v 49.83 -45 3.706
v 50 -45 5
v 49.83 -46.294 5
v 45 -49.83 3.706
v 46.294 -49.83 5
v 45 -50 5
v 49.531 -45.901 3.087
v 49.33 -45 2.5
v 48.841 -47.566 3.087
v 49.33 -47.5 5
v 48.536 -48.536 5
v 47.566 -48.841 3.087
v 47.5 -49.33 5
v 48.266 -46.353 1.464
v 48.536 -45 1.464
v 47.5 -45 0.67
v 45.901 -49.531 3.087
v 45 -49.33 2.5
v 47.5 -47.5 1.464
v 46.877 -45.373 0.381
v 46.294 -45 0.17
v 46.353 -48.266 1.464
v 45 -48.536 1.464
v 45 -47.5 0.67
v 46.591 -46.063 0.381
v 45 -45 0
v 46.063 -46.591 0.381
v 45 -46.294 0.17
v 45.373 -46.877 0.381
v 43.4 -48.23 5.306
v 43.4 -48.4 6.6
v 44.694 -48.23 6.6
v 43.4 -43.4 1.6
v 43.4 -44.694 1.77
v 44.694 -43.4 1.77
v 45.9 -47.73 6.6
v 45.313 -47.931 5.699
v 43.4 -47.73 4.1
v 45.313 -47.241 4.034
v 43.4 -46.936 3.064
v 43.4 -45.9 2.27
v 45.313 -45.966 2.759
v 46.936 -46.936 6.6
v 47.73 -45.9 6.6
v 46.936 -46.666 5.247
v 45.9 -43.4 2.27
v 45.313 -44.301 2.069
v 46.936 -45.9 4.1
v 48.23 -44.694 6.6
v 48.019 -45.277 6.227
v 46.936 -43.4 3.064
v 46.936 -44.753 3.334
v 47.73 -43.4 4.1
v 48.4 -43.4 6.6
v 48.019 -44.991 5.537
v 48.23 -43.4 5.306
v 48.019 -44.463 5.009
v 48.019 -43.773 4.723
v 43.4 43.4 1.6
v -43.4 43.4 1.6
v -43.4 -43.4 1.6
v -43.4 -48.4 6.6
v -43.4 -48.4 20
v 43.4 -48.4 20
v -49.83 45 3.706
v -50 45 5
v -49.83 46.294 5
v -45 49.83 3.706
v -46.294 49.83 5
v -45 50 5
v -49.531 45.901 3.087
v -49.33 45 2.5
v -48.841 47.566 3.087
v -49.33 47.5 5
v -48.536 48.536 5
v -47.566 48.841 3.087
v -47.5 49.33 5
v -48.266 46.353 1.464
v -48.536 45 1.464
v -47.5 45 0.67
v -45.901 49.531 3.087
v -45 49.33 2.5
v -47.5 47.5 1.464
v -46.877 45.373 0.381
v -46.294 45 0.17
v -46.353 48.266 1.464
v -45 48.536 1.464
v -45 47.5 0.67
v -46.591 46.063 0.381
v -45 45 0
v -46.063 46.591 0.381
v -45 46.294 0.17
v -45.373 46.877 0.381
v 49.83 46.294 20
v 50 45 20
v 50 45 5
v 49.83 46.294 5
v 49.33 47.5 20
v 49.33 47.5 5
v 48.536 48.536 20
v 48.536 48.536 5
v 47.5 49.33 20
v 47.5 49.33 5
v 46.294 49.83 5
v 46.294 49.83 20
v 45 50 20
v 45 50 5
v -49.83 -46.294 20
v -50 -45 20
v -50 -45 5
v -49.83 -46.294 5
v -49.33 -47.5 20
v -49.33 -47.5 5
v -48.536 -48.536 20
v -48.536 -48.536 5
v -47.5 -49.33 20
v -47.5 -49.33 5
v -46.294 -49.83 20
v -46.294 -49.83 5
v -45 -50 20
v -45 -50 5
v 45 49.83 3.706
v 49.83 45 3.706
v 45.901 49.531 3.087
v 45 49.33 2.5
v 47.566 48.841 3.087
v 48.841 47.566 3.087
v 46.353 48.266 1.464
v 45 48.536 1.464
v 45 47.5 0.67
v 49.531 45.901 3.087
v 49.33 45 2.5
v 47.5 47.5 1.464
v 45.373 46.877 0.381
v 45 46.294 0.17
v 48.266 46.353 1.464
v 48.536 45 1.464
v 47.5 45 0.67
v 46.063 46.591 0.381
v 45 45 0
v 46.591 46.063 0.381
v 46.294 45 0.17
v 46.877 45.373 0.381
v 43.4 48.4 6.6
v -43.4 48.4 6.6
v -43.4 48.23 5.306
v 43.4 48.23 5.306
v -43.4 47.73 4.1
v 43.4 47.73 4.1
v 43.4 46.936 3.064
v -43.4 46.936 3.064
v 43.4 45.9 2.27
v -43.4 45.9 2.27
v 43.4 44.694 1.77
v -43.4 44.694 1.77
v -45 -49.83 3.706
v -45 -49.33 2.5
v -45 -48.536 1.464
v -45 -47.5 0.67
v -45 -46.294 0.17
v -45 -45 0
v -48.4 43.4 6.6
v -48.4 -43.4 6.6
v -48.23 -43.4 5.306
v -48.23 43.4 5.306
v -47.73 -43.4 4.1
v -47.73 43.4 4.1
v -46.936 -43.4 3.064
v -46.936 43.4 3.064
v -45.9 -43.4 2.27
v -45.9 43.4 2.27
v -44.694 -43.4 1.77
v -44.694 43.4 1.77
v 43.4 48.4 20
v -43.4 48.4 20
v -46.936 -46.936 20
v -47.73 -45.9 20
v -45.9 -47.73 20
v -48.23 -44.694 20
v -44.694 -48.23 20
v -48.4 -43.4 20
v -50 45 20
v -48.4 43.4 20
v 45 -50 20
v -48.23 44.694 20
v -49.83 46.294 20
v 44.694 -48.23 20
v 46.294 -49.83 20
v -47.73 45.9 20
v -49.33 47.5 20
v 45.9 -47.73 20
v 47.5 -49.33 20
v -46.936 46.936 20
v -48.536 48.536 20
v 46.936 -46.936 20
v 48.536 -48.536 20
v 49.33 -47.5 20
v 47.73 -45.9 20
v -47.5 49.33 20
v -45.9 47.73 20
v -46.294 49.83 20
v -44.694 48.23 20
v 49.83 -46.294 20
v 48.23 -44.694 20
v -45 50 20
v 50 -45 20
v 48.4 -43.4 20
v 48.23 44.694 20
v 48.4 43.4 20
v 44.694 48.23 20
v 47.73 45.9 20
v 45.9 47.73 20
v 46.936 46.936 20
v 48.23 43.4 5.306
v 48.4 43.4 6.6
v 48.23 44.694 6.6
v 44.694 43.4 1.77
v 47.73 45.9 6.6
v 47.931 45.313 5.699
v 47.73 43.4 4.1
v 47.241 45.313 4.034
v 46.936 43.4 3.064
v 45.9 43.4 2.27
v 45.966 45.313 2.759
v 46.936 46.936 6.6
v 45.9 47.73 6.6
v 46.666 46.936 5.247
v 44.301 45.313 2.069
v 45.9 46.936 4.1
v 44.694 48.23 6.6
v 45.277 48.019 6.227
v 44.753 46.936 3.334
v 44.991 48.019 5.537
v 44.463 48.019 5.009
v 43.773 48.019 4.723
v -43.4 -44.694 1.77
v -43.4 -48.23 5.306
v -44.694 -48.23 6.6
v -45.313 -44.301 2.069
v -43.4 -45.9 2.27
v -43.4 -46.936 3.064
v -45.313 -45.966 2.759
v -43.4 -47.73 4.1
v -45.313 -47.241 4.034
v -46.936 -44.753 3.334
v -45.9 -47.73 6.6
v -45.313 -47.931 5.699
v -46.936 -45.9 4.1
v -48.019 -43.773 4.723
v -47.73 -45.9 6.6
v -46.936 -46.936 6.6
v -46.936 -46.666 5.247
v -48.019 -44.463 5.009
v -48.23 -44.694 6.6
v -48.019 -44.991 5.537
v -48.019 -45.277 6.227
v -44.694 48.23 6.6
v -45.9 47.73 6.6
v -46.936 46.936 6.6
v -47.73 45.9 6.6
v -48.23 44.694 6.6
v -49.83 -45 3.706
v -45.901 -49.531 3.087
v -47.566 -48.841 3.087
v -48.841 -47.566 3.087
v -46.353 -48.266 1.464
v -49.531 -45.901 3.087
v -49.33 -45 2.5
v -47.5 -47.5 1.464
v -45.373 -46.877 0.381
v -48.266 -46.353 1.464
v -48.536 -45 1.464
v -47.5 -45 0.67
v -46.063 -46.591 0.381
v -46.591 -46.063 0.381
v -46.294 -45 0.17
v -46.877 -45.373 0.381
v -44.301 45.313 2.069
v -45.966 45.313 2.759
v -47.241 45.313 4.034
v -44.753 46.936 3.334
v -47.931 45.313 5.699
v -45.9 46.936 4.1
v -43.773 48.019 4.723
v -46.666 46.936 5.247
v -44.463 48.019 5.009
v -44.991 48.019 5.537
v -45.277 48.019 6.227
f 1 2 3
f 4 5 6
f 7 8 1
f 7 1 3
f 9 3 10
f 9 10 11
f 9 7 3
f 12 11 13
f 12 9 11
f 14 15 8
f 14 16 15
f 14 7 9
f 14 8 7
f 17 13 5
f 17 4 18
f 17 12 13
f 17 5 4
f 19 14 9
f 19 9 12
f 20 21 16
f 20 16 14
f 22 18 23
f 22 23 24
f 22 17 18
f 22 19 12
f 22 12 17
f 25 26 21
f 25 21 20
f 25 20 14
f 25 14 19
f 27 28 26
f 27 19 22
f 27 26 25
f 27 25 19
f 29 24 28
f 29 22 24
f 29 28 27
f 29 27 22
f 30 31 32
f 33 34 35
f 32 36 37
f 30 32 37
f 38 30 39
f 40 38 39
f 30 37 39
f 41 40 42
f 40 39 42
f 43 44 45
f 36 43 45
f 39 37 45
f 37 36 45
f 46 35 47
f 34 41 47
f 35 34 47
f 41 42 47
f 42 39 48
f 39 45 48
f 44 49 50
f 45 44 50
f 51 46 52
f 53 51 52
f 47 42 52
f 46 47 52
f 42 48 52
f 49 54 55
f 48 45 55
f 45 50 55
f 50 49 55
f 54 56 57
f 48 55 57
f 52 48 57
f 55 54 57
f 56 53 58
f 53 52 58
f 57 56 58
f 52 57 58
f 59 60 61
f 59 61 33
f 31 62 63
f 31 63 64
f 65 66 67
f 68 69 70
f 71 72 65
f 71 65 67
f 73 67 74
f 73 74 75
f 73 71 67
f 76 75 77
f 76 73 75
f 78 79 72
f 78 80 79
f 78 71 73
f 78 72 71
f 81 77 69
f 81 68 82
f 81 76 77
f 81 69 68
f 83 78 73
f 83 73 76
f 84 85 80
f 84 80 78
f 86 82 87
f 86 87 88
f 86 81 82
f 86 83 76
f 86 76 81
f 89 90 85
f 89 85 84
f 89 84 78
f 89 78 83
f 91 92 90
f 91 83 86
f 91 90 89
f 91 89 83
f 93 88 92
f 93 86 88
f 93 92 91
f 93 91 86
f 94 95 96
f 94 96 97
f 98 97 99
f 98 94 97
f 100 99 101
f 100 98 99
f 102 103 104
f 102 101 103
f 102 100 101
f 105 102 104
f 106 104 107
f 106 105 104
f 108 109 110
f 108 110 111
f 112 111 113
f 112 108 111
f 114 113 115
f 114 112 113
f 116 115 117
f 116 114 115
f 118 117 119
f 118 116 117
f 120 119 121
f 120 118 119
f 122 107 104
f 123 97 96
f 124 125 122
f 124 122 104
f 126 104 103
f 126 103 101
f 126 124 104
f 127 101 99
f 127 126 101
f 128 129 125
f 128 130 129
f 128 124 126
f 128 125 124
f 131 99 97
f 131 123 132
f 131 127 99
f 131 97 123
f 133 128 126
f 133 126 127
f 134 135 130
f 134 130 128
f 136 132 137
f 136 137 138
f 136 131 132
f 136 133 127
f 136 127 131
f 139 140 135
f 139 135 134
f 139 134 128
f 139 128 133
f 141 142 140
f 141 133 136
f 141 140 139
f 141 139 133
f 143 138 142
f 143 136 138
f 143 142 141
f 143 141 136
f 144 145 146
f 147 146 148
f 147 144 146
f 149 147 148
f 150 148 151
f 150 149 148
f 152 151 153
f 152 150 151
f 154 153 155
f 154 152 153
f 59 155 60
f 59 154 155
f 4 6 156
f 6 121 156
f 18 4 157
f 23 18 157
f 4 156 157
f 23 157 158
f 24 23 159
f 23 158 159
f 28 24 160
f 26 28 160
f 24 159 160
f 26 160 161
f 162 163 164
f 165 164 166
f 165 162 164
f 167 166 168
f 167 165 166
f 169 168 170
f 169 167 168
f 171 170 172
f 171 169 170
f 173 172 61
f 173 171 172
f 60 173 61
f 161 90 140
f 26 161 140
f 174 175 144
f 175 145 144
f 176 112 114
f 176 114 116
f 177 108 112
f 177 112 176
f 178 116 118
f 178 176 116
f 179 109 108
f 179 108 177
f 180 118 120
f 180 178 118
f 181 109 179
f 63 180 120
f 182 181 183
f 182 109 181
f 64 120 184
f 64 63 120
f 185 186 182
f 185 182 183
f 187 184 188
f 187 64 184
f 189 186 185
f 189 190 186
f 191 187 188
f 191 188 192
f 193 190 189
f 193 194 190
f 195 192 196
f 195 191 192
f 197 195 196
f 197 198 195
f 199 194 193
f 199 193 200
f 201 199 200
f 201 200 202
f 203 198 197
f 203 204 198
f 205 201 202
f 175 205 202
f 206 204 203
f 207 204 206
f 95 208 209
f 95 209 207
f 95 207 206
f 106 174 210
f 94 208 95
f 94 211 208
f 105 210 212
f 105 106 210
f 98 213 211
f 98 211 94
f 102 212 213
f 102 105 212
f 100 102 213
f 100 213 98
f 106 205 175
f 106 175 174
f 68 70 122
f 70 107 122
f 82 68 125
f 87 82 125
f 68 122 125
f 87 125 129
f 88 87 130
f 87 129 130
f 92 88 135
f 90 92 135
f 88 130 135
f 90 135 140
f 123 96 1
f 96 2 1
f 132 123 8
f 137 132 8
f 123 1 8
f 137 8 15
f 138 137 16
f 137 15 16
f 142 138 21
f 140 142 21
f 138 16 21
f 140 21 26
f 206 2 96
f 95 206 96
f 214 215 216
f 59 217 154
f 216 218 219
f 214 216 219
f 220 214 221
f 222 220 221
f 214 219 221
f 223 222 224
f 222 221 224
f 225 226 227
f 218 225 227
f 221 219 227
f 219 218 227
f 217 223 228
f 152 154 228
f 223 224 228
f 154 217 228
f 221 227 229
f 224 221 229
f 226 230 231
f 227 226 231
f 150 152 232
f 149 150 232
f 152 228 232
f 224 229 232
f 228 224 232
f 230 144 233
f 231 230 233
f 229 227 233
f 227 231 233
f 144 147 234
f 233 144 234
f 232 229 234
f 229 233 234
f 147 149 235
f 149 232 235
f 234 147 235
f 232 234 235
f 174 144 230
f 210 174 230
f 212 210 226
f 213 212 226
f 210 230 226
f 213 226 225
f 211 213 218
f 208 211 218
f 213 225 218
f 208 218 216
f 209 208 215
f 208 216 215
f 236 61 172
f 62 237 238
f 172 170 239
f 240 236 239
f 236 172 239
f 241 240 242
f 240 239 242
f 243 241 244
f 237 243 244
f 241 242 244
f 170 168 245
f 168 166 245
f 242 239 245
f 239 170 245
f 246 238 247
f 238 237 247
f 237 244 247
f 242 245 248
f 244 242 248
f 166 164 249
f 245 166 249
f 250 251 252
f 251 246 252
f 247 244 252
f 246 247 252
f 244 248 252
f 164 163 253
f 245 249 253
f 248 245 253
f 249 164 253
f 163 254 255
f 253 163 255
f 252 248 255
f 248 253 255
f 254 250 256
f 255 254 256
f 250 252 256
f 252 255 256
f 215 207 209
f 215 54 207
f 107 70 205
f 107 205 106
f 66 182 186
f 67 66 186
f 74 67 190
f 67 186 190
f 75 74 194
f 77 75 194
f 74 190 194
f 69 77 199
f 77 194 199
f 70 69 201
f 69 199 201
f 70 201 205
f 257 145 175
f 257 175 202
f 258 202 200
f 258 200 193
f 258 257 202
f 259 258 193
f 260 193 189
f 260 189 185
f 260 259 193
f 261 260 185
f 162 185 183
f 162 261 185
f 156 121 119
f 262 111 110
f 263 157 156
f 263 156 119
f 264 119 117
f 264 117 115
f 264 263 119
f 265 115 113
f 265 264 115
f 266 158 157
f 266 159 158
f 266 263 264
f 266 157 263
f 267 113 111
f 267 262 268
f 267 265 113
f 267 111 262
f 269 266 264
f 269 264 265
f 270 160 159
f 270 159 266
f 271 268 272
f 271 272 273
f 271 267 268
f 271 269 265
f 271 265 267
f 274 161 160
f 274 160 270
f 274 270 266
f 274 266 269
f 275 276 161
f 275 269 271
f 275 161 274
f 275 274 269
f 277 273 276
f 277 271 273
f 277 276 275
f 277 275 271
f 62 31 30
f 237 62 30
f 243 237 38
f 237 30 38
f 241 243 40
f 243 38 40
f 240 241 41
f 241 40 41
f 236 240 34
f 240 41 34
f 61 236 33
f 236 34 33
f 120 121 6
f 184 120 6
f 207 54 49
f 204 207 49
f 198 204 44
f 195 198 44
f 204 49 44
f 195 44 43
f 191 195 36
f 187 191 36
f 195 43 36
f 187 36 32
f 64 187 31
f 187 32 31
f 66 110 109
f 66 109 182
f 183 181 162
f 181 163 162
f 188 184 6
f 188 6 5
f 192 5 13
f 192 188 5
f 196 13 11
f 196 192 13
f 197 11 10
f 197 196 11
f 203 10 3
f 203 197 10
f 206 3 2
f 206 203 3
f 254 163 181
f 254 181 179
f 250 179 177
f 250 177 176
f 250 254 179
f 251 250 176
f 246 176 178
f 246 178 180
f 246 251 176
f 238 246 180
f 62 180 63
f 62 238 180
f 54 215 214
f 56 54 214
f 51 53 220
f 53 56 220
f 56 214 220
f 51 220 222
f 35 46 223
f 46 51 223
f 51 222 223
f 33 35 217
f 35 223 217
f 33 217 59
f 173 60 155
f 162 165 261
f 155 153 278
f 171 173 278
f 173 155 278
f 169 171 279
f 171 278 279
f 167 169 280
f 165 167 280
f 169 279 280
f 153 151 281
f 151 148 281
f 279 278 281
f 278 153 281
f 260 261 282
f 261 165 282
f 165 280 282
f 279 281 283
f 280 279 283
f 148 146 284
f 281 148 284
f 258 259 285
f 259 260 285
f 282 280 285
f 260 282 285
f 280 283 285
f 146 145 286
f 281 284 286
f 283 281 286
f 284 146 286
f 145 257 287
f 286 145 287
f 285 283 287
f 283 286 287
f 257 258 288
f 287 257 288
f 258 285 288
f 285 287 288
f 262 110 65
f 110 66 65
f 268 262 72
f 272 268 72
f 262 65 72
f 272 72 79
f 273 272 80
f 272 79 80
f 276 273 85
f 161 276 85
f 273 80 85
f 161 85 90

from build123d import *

# Parameters (mm, degrees)
F0_W         = 100
F0_H         = 100
F1_DEPTH     = 20
F2_T         = -1.6
F3_R         = 5
F4_T1_DEPTH  = 13.4
F4_S5_W      = 5
F4_S5_H      = 5
F4_T6_DEPTH  = 5
F4_S11_W     = 5
F4_S11_H     = 5
F4_T12_DEPTH = 5
F4_S17_W     = 5
F4_S17_H     = 5
F4_T18_DEPTH = 5
F4_S23_W     = 5
F4_S23_H     = 5
F4_T24_DEPTH = 5
F5_R         = 5
F6_R         = 5


# Not quite as in the source:
# - a fillet or chamfer that OpenCascade refuses, or shapes differently, is made with other operations: its cross-section is extruded or revolved along the edge and cut away or added


with BuildPart() as f1:
    # F0 (on Top) → F1 (new body)
    with BuildSketch(Plane.XY):
        Rectangle(F0_W, F0_H)
    extrude(amount=F1_DEPTH)

    # F2
    f2_openings = [f1.faces().sort_by_distance(p)[0] for p in [
        (0, 0, 20),
    ]]
    offset(amount=F2_T, openings=f2_openings)

    # F3
    f3_edges = [f1.edges().sort_by_distance(p)[0] for p in [
        (-48.4, 0, 1.6),
        (0, 48.4, 1.6),
        (48.4, 0, 1.6),
        (0, -48.4, 1.6),
    ]]
    fillet(f3_edges, radius=F3_R)

    # F4: fillet of radius 5 on 8 edges, made by hand

    # F4_s2 → F4_t1 (join)
    with BuildSketch(Plane.XY.offset(6.6)):
        with BuildLine():
            ThreePointArc((43.4, 48.4), (46.9355339059, 46.9355339059), (48.4, 43.4))
            Line((48.4, 43.4), (48.4, 48.4))
            Line((48.4, 48.4), (43.4, 48.4))
        make_face()
        with BuildLine():
            ThreePointArc((48.4, -43.4), (46.9355339059, -46.9355339059), (43.4, -48.4))
            Line((43.4, -48.4), (48.4, -48.4))
            Line((48.4, -48.4), (48.4, -43.4))
        make_face()
        with BuildLine():
            ThreePointArc((-48.4, -43.4), (-46.9355339059, -46.9355339059), (-43.4, -48.4))
            Line((-43.4, -48.4), (-48.4, -48.4))
            Line((-48.4, -48.4), (-48.4, -43.4))
        make_face()
        with BuildLine():
            ThreePointArc((-43.4, 48.4), (-46.9355339059, 46.9355339059), (-48.4, 43.4))
            Line((-48.4, 43.4), (-48.4, 48.4))
            Line((-48.4, 48.4), (-43.4, 48.4))
        make_face()
    extrude(amount=F4_T1_DEPTH)


with BuildPart() as f4_tool4:
    # F4_s5 → F4_t6 (new body)
    with BuildSketch(Plane.XZ.offset(-43.4)):
        with Locations((45.9, 4.1)):
            Rectangle(F4_S5_W, F4_S5_H)
    extrude(amount=-F4_T6_DEPTH)

    # F4_s7 → F4_t8 (revolve, cut)
    with BuildSketch(Plane(origin=(43.4, 43.4, 6.6), x_dir=(-0.7071067812, 0, 0.7071067812), z_dir=(-0.7071067812, 0, -0.7071067812))):
        with BuildLine():
            ThreePointArc((0, -5), (5, 0), (0, 5))
            Line((0, 5), (0, -5))
        make_face()
    revolve(axis=Axis((43.4, 43.4, 6.6), (0, 1, 0)), mode=Mode.SUBTRACT)


with BuildPart() as f1_1:
    add(f1.part)

    # F4_t3: union F4_tool4
    add(f4_tool4.part)


with BuildPart() as f4_tool10:
    # F4_s11 → F4_t12 (new body)
    with BuildSketch(Plane.YZ.offset(43.4)):
        with Locations((-45.9, 4.1)):
            Rectangle(F4_S11_W, F4_S11_H)
    extrude(amount=F4_T12_DEPTH)

    # F4_s13 → F4_t14 (revolve, cut)
    with BuildSketch(Plane(origin=(43.4, -43.4, 6.6), x_dir=(0, 0.7071067812, 0.7071067812), z_dir=(0, 0.7071067812, -0.7071067812))):
        with BuildLine():
            ThreePointArc((0, -5), (5, 0), (0, 5))
            Line((0, 5), (0, -5))
        make_face()
    revolve(axis=Axis((43.4, -43.4, 6.6), (1, 0, 0)), mode=Mode.SUBTRACT)


with BuildPart() as f1_2:
    add(f1_1.part)

    # F4_t9: union F4_tool10
    add(f4_tool10.part)


with BuildPart() as f4_tool16:
    # F4_s17 → F4_t18 (new body)
    with BuildSketch(Plane.YZ.offset(-43.4)):
        with Locations((-45.9, 4.1)):
            Rectangle(F4_S17_W, F4_S17_H)
    extrude(amount=-F4_T18_DEPTH)

    # F4_s19 → F4_t20 (revolve, cut)
    with BuildSketch(Plane(origin=(-43.4, -43.4, 6.6), x_dir=(0, 0.7071067812, 0.7071067812), z_dir=(0, -0.7071067812, 0.7071067812))):
        with BuildLine():
            ThreePointArc((0, -5), (5, 0), (0, 5))
            Line((0, 5), (0, -5))
        make_face()
    revolve(axis=Axis((-43.4, -43.4, 6.6), (-1, 0, 0)), mode=Mode.SUBTRACT)


with BuildPart() as f1_3:
    add(f1_2.part)

    # F4_t15: union F4_tool16
    add(f4_tool16.part)


with BuildPart() as f4_tool22:
    # F4_s23 → F4_t24 (new body)
    with BuildSketch(Plane.XZ.offset(-43.4)):
        with Locations((-45.9, 4.1)):
            Rectangle(F4_S23_W, F4_S23_H)
    extrude(amount=-F4_T24_DEPTH)

    # F4_s25 → F4_t26 (revolve, cut)
    with BuildSketch(Plane(origin=(-43.4, 43.4, 6.6), x_dir=(0.7071067812, 0, 0.7071067812), z_dir=(-0.7071067812, 0, 0.7071067812))):
        with BuildLine():
            ThreePointArc((0, -5), (5, 0), (0, 5))
            Line((0, 5), (0, -5))
        make_face()
    revolve(axis=Axis((-43.4, 43.4, 6.6), (0, 1, 0)), mode=Mode.SUBTRACT)


with BuildPart() as f1_4:
    add(f1_3.part)

    # F4_t21: union F4_tool22
    add(f4_tool22.part)

    # F5
    f5_edges = [f1_4.edges().sort_by_distance(p)[0] for p in [
        (50, -50, 10),
        (-50, -50, 10),
        (-50, 50, 10),
        (50, 50, 10),
    ]]
    fillet(f5_edges, radius=F5_R)

    # F6
    f6_edges = [f1_4.edges().sort_by_distance(p)[0] for p in [
        (-50, 0, 0),
        (0, 50, 0),
        (-48.535534, 48.535534, 0),
        (48.535534, 48.535534, 0),
        (50, 0, 0),
        (48.535534, -48.535534, 0),
        (0, -50, 0),
        (-48.535534, -48.535534, 0),
    ]]
    fillet(f6_edges, radius=F6_R)


solid = f1_4.part
